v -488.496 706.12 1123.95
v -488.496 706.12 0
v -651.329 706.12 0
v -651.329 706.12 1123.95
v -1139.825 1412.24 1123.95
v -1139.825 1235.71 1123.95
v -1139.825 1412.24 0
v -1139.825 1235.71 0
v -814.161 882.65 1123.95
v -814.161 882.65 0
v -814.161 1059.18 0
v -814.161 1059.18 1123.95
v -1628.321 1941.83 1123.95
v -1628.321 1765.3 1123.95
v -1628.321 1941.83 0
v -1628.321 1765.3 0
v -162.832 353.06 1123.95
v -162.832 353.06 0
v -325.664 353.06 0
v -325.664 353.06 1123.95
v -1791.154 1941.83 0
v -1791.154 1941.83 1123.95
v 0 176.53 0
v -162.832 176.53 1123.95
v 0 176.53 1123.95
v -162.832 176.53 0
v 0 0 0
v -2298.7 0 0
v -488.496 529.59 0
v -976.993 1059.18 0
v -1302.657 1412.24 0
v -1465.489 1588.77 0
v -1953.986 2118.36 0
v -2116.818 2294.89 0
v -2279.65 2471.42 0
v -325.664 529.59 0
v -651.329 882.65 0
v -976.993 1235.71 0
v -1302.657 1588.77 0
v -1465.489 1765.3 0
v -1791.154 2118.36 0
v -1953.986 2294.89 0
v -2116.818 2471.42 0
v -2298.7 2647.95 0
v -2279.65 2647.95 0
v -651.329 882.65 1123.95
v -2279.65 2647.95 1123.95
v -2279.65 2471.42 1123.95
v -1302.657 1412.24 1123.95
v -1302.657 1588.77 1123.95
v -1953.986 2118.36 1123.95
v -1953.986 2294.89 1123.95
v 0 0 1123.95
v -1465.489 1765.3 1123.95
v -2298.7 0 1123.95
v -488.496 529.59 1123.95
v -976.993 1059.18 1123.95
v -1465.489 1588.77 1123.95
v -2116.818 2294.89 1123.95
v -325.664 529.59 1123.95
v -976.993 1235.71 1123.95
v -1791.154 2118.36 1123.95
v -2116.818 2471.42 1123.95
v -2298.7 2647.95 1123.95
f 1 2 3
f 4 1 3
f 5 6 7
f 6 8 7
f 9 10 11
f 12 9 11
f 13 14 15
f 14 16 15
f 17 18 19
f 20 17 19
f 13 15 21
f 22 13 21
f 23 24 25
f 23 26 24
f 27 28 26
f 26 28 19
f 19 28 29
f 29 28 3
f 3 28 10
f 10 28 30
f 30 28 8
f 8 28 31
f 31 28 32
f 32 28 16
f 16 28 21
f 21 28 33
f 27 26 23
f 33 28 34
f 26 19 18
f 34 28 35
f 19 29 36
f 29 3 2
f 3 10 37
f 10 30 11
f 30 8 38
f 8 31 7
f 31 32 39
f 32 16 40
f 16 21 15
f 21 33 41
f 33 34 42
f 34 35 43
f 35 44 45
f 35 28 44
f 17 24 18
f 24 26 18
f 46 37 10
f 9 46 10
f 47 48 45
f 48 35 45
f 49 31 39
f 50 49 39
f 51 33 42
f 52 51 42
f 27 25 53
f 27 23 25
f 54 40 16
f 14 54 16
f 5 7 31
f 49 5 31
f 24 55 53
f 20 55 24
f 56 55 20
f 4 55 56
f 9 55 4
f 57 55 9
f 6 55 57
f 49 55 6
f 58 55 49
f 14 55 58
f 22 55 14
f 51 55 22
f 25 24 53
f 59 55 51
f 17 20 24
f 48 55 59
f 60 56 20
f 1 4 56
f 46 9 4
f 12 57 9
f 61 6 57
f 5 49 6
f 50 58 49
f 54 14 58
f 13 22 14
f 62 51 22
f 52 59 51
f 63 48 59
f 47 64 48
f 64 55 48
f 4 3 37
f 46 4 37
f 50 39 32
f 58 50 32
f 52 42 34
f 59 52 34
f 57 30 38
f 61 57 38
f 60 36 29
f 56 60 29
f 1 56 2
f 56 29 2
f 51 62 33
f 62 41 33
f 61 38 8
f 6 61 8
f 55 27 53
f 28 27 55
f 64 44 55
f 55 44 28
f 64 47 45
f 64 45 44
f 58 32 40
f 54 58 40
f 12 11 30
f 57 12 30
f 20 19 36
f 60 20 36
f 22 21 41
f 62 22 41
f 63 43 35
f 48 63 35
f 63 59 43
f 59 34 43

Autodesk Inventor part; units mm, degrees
ref_plane "YZ Plane" through (0, 0, 0) normal (1, 0, 0) x (0, 1, 0)
ref_plane "XZ Plane" through (0, 0, 0) normal (0, 1, 0) x (-1, 0, 0)
ref_plane "XY Plane" through (0, 0, 0) normal (0, 0, 1) x (1, 0, 0)
sketch "Sketch1" plane through (0, 0, 0) normal (0, 0, 1) x (1, 0, 0)
  line L0 (-162.8321, 176.53) -> (-162.8321, 353.06)
  line L1 (-162.8321, 353.06) -> (-325.6643, 353.06)
  line L2 (-325.6643, 353.06) -> (-325.6643, 529.59)
  line L3 (-325.6643, 529.59) -> (-488.4964, 529.59)
  line L4 (-488.4964, 529.59) -> (-488.4964, 706.12)
  line L5 (-488.4964, 706.12) -> (-651.3286, 706.12)
  line L6 (-651.3286, 706.12) -> (-651.3286, 882.65)
  line L7 (-651.3286, 882.65) -> (-814.1607, 882.65)
  line L8 (-814.1607, 882.65) -> (-814.1607, 1059.18)
  line L9 (-814.1607, 1059.18) -> (-976.9929, 1059.18)
  line L10 (-976.9929, 1059.18) -> (-976.9929, 1235.71)
  line L11 (-976.9929, 1235.71) -> (-1139.825, 1235.71)
  line L12 (-1139.825, 1235.71) -> (-1139.825, 1412.24)
  line L13 (-1139.825, 1412.24) -> (-1302.6571, 1412.24)
  line L14 (-1302.6571, 1412.24) -> (-1302.6571, 1588.77)
  line L15 (-1302.6571, 1588.77) -> (-1465.4893, 1588.77)
  line L16 (-1465.4893, 1588.77) -> (-1465.4893, 1765.3)
  line L17 (-1465.4893, 1765.3) -> (-1628.3214, 1765.3)
  line L18 (-1628.3214, 1765.3) -> (-1628.3214, 1941.83)
  line L19 (-1628.3214, 1941.83) -> (-1791.1536, 1941.83)
  line L20 (-1791.1536, 1941.83) -> (-1791.1536, 2118.36)
  line L21 (-1791.1536, 2118.36) -> (-1953.9857, 2118.36)
  line L22 (-1953.9857, 2118.36) -> (-1953.9857, 2294.89)
  line L23 (-1953.9857, 2294.89) -> (-2116.8179, 2294.89)
  line L24 (-162.8321, 176.53) -> (0, 176.53)
  line L25 (0, 176.53) -> (0, 0)
  line L26 (0, 0) -> (-2298.7, 0)
  line L27 (-2116.8179, 2294.89) -> (-2116.8179, 2471.42)
  line L28 (-2116.8179, 2471.42) -> (-2279.65, 2471.42)
  line L29 (-2279.65, 2471.42) -> (-2279.65, 2647.95)
  line L30 (-2279.65, 2647.95) -> (-2298.7, 2647.95)
  line L31 (-2298.7, 2647.95) -> (-2298.7, 0)
  point P0 (-2762.8302, 625.5305)
  dimension "d21" = 2647.95
  dimension "d22" = 2298.7
  dimension "d23" = 19.05
extrude "Extrusion1" add sketch "Sketch1" along normal blind 1123.95
properties part number "Stairs_Between_Finished_Basement_And_First_Floor" material "Wood (Southern Pine)"
